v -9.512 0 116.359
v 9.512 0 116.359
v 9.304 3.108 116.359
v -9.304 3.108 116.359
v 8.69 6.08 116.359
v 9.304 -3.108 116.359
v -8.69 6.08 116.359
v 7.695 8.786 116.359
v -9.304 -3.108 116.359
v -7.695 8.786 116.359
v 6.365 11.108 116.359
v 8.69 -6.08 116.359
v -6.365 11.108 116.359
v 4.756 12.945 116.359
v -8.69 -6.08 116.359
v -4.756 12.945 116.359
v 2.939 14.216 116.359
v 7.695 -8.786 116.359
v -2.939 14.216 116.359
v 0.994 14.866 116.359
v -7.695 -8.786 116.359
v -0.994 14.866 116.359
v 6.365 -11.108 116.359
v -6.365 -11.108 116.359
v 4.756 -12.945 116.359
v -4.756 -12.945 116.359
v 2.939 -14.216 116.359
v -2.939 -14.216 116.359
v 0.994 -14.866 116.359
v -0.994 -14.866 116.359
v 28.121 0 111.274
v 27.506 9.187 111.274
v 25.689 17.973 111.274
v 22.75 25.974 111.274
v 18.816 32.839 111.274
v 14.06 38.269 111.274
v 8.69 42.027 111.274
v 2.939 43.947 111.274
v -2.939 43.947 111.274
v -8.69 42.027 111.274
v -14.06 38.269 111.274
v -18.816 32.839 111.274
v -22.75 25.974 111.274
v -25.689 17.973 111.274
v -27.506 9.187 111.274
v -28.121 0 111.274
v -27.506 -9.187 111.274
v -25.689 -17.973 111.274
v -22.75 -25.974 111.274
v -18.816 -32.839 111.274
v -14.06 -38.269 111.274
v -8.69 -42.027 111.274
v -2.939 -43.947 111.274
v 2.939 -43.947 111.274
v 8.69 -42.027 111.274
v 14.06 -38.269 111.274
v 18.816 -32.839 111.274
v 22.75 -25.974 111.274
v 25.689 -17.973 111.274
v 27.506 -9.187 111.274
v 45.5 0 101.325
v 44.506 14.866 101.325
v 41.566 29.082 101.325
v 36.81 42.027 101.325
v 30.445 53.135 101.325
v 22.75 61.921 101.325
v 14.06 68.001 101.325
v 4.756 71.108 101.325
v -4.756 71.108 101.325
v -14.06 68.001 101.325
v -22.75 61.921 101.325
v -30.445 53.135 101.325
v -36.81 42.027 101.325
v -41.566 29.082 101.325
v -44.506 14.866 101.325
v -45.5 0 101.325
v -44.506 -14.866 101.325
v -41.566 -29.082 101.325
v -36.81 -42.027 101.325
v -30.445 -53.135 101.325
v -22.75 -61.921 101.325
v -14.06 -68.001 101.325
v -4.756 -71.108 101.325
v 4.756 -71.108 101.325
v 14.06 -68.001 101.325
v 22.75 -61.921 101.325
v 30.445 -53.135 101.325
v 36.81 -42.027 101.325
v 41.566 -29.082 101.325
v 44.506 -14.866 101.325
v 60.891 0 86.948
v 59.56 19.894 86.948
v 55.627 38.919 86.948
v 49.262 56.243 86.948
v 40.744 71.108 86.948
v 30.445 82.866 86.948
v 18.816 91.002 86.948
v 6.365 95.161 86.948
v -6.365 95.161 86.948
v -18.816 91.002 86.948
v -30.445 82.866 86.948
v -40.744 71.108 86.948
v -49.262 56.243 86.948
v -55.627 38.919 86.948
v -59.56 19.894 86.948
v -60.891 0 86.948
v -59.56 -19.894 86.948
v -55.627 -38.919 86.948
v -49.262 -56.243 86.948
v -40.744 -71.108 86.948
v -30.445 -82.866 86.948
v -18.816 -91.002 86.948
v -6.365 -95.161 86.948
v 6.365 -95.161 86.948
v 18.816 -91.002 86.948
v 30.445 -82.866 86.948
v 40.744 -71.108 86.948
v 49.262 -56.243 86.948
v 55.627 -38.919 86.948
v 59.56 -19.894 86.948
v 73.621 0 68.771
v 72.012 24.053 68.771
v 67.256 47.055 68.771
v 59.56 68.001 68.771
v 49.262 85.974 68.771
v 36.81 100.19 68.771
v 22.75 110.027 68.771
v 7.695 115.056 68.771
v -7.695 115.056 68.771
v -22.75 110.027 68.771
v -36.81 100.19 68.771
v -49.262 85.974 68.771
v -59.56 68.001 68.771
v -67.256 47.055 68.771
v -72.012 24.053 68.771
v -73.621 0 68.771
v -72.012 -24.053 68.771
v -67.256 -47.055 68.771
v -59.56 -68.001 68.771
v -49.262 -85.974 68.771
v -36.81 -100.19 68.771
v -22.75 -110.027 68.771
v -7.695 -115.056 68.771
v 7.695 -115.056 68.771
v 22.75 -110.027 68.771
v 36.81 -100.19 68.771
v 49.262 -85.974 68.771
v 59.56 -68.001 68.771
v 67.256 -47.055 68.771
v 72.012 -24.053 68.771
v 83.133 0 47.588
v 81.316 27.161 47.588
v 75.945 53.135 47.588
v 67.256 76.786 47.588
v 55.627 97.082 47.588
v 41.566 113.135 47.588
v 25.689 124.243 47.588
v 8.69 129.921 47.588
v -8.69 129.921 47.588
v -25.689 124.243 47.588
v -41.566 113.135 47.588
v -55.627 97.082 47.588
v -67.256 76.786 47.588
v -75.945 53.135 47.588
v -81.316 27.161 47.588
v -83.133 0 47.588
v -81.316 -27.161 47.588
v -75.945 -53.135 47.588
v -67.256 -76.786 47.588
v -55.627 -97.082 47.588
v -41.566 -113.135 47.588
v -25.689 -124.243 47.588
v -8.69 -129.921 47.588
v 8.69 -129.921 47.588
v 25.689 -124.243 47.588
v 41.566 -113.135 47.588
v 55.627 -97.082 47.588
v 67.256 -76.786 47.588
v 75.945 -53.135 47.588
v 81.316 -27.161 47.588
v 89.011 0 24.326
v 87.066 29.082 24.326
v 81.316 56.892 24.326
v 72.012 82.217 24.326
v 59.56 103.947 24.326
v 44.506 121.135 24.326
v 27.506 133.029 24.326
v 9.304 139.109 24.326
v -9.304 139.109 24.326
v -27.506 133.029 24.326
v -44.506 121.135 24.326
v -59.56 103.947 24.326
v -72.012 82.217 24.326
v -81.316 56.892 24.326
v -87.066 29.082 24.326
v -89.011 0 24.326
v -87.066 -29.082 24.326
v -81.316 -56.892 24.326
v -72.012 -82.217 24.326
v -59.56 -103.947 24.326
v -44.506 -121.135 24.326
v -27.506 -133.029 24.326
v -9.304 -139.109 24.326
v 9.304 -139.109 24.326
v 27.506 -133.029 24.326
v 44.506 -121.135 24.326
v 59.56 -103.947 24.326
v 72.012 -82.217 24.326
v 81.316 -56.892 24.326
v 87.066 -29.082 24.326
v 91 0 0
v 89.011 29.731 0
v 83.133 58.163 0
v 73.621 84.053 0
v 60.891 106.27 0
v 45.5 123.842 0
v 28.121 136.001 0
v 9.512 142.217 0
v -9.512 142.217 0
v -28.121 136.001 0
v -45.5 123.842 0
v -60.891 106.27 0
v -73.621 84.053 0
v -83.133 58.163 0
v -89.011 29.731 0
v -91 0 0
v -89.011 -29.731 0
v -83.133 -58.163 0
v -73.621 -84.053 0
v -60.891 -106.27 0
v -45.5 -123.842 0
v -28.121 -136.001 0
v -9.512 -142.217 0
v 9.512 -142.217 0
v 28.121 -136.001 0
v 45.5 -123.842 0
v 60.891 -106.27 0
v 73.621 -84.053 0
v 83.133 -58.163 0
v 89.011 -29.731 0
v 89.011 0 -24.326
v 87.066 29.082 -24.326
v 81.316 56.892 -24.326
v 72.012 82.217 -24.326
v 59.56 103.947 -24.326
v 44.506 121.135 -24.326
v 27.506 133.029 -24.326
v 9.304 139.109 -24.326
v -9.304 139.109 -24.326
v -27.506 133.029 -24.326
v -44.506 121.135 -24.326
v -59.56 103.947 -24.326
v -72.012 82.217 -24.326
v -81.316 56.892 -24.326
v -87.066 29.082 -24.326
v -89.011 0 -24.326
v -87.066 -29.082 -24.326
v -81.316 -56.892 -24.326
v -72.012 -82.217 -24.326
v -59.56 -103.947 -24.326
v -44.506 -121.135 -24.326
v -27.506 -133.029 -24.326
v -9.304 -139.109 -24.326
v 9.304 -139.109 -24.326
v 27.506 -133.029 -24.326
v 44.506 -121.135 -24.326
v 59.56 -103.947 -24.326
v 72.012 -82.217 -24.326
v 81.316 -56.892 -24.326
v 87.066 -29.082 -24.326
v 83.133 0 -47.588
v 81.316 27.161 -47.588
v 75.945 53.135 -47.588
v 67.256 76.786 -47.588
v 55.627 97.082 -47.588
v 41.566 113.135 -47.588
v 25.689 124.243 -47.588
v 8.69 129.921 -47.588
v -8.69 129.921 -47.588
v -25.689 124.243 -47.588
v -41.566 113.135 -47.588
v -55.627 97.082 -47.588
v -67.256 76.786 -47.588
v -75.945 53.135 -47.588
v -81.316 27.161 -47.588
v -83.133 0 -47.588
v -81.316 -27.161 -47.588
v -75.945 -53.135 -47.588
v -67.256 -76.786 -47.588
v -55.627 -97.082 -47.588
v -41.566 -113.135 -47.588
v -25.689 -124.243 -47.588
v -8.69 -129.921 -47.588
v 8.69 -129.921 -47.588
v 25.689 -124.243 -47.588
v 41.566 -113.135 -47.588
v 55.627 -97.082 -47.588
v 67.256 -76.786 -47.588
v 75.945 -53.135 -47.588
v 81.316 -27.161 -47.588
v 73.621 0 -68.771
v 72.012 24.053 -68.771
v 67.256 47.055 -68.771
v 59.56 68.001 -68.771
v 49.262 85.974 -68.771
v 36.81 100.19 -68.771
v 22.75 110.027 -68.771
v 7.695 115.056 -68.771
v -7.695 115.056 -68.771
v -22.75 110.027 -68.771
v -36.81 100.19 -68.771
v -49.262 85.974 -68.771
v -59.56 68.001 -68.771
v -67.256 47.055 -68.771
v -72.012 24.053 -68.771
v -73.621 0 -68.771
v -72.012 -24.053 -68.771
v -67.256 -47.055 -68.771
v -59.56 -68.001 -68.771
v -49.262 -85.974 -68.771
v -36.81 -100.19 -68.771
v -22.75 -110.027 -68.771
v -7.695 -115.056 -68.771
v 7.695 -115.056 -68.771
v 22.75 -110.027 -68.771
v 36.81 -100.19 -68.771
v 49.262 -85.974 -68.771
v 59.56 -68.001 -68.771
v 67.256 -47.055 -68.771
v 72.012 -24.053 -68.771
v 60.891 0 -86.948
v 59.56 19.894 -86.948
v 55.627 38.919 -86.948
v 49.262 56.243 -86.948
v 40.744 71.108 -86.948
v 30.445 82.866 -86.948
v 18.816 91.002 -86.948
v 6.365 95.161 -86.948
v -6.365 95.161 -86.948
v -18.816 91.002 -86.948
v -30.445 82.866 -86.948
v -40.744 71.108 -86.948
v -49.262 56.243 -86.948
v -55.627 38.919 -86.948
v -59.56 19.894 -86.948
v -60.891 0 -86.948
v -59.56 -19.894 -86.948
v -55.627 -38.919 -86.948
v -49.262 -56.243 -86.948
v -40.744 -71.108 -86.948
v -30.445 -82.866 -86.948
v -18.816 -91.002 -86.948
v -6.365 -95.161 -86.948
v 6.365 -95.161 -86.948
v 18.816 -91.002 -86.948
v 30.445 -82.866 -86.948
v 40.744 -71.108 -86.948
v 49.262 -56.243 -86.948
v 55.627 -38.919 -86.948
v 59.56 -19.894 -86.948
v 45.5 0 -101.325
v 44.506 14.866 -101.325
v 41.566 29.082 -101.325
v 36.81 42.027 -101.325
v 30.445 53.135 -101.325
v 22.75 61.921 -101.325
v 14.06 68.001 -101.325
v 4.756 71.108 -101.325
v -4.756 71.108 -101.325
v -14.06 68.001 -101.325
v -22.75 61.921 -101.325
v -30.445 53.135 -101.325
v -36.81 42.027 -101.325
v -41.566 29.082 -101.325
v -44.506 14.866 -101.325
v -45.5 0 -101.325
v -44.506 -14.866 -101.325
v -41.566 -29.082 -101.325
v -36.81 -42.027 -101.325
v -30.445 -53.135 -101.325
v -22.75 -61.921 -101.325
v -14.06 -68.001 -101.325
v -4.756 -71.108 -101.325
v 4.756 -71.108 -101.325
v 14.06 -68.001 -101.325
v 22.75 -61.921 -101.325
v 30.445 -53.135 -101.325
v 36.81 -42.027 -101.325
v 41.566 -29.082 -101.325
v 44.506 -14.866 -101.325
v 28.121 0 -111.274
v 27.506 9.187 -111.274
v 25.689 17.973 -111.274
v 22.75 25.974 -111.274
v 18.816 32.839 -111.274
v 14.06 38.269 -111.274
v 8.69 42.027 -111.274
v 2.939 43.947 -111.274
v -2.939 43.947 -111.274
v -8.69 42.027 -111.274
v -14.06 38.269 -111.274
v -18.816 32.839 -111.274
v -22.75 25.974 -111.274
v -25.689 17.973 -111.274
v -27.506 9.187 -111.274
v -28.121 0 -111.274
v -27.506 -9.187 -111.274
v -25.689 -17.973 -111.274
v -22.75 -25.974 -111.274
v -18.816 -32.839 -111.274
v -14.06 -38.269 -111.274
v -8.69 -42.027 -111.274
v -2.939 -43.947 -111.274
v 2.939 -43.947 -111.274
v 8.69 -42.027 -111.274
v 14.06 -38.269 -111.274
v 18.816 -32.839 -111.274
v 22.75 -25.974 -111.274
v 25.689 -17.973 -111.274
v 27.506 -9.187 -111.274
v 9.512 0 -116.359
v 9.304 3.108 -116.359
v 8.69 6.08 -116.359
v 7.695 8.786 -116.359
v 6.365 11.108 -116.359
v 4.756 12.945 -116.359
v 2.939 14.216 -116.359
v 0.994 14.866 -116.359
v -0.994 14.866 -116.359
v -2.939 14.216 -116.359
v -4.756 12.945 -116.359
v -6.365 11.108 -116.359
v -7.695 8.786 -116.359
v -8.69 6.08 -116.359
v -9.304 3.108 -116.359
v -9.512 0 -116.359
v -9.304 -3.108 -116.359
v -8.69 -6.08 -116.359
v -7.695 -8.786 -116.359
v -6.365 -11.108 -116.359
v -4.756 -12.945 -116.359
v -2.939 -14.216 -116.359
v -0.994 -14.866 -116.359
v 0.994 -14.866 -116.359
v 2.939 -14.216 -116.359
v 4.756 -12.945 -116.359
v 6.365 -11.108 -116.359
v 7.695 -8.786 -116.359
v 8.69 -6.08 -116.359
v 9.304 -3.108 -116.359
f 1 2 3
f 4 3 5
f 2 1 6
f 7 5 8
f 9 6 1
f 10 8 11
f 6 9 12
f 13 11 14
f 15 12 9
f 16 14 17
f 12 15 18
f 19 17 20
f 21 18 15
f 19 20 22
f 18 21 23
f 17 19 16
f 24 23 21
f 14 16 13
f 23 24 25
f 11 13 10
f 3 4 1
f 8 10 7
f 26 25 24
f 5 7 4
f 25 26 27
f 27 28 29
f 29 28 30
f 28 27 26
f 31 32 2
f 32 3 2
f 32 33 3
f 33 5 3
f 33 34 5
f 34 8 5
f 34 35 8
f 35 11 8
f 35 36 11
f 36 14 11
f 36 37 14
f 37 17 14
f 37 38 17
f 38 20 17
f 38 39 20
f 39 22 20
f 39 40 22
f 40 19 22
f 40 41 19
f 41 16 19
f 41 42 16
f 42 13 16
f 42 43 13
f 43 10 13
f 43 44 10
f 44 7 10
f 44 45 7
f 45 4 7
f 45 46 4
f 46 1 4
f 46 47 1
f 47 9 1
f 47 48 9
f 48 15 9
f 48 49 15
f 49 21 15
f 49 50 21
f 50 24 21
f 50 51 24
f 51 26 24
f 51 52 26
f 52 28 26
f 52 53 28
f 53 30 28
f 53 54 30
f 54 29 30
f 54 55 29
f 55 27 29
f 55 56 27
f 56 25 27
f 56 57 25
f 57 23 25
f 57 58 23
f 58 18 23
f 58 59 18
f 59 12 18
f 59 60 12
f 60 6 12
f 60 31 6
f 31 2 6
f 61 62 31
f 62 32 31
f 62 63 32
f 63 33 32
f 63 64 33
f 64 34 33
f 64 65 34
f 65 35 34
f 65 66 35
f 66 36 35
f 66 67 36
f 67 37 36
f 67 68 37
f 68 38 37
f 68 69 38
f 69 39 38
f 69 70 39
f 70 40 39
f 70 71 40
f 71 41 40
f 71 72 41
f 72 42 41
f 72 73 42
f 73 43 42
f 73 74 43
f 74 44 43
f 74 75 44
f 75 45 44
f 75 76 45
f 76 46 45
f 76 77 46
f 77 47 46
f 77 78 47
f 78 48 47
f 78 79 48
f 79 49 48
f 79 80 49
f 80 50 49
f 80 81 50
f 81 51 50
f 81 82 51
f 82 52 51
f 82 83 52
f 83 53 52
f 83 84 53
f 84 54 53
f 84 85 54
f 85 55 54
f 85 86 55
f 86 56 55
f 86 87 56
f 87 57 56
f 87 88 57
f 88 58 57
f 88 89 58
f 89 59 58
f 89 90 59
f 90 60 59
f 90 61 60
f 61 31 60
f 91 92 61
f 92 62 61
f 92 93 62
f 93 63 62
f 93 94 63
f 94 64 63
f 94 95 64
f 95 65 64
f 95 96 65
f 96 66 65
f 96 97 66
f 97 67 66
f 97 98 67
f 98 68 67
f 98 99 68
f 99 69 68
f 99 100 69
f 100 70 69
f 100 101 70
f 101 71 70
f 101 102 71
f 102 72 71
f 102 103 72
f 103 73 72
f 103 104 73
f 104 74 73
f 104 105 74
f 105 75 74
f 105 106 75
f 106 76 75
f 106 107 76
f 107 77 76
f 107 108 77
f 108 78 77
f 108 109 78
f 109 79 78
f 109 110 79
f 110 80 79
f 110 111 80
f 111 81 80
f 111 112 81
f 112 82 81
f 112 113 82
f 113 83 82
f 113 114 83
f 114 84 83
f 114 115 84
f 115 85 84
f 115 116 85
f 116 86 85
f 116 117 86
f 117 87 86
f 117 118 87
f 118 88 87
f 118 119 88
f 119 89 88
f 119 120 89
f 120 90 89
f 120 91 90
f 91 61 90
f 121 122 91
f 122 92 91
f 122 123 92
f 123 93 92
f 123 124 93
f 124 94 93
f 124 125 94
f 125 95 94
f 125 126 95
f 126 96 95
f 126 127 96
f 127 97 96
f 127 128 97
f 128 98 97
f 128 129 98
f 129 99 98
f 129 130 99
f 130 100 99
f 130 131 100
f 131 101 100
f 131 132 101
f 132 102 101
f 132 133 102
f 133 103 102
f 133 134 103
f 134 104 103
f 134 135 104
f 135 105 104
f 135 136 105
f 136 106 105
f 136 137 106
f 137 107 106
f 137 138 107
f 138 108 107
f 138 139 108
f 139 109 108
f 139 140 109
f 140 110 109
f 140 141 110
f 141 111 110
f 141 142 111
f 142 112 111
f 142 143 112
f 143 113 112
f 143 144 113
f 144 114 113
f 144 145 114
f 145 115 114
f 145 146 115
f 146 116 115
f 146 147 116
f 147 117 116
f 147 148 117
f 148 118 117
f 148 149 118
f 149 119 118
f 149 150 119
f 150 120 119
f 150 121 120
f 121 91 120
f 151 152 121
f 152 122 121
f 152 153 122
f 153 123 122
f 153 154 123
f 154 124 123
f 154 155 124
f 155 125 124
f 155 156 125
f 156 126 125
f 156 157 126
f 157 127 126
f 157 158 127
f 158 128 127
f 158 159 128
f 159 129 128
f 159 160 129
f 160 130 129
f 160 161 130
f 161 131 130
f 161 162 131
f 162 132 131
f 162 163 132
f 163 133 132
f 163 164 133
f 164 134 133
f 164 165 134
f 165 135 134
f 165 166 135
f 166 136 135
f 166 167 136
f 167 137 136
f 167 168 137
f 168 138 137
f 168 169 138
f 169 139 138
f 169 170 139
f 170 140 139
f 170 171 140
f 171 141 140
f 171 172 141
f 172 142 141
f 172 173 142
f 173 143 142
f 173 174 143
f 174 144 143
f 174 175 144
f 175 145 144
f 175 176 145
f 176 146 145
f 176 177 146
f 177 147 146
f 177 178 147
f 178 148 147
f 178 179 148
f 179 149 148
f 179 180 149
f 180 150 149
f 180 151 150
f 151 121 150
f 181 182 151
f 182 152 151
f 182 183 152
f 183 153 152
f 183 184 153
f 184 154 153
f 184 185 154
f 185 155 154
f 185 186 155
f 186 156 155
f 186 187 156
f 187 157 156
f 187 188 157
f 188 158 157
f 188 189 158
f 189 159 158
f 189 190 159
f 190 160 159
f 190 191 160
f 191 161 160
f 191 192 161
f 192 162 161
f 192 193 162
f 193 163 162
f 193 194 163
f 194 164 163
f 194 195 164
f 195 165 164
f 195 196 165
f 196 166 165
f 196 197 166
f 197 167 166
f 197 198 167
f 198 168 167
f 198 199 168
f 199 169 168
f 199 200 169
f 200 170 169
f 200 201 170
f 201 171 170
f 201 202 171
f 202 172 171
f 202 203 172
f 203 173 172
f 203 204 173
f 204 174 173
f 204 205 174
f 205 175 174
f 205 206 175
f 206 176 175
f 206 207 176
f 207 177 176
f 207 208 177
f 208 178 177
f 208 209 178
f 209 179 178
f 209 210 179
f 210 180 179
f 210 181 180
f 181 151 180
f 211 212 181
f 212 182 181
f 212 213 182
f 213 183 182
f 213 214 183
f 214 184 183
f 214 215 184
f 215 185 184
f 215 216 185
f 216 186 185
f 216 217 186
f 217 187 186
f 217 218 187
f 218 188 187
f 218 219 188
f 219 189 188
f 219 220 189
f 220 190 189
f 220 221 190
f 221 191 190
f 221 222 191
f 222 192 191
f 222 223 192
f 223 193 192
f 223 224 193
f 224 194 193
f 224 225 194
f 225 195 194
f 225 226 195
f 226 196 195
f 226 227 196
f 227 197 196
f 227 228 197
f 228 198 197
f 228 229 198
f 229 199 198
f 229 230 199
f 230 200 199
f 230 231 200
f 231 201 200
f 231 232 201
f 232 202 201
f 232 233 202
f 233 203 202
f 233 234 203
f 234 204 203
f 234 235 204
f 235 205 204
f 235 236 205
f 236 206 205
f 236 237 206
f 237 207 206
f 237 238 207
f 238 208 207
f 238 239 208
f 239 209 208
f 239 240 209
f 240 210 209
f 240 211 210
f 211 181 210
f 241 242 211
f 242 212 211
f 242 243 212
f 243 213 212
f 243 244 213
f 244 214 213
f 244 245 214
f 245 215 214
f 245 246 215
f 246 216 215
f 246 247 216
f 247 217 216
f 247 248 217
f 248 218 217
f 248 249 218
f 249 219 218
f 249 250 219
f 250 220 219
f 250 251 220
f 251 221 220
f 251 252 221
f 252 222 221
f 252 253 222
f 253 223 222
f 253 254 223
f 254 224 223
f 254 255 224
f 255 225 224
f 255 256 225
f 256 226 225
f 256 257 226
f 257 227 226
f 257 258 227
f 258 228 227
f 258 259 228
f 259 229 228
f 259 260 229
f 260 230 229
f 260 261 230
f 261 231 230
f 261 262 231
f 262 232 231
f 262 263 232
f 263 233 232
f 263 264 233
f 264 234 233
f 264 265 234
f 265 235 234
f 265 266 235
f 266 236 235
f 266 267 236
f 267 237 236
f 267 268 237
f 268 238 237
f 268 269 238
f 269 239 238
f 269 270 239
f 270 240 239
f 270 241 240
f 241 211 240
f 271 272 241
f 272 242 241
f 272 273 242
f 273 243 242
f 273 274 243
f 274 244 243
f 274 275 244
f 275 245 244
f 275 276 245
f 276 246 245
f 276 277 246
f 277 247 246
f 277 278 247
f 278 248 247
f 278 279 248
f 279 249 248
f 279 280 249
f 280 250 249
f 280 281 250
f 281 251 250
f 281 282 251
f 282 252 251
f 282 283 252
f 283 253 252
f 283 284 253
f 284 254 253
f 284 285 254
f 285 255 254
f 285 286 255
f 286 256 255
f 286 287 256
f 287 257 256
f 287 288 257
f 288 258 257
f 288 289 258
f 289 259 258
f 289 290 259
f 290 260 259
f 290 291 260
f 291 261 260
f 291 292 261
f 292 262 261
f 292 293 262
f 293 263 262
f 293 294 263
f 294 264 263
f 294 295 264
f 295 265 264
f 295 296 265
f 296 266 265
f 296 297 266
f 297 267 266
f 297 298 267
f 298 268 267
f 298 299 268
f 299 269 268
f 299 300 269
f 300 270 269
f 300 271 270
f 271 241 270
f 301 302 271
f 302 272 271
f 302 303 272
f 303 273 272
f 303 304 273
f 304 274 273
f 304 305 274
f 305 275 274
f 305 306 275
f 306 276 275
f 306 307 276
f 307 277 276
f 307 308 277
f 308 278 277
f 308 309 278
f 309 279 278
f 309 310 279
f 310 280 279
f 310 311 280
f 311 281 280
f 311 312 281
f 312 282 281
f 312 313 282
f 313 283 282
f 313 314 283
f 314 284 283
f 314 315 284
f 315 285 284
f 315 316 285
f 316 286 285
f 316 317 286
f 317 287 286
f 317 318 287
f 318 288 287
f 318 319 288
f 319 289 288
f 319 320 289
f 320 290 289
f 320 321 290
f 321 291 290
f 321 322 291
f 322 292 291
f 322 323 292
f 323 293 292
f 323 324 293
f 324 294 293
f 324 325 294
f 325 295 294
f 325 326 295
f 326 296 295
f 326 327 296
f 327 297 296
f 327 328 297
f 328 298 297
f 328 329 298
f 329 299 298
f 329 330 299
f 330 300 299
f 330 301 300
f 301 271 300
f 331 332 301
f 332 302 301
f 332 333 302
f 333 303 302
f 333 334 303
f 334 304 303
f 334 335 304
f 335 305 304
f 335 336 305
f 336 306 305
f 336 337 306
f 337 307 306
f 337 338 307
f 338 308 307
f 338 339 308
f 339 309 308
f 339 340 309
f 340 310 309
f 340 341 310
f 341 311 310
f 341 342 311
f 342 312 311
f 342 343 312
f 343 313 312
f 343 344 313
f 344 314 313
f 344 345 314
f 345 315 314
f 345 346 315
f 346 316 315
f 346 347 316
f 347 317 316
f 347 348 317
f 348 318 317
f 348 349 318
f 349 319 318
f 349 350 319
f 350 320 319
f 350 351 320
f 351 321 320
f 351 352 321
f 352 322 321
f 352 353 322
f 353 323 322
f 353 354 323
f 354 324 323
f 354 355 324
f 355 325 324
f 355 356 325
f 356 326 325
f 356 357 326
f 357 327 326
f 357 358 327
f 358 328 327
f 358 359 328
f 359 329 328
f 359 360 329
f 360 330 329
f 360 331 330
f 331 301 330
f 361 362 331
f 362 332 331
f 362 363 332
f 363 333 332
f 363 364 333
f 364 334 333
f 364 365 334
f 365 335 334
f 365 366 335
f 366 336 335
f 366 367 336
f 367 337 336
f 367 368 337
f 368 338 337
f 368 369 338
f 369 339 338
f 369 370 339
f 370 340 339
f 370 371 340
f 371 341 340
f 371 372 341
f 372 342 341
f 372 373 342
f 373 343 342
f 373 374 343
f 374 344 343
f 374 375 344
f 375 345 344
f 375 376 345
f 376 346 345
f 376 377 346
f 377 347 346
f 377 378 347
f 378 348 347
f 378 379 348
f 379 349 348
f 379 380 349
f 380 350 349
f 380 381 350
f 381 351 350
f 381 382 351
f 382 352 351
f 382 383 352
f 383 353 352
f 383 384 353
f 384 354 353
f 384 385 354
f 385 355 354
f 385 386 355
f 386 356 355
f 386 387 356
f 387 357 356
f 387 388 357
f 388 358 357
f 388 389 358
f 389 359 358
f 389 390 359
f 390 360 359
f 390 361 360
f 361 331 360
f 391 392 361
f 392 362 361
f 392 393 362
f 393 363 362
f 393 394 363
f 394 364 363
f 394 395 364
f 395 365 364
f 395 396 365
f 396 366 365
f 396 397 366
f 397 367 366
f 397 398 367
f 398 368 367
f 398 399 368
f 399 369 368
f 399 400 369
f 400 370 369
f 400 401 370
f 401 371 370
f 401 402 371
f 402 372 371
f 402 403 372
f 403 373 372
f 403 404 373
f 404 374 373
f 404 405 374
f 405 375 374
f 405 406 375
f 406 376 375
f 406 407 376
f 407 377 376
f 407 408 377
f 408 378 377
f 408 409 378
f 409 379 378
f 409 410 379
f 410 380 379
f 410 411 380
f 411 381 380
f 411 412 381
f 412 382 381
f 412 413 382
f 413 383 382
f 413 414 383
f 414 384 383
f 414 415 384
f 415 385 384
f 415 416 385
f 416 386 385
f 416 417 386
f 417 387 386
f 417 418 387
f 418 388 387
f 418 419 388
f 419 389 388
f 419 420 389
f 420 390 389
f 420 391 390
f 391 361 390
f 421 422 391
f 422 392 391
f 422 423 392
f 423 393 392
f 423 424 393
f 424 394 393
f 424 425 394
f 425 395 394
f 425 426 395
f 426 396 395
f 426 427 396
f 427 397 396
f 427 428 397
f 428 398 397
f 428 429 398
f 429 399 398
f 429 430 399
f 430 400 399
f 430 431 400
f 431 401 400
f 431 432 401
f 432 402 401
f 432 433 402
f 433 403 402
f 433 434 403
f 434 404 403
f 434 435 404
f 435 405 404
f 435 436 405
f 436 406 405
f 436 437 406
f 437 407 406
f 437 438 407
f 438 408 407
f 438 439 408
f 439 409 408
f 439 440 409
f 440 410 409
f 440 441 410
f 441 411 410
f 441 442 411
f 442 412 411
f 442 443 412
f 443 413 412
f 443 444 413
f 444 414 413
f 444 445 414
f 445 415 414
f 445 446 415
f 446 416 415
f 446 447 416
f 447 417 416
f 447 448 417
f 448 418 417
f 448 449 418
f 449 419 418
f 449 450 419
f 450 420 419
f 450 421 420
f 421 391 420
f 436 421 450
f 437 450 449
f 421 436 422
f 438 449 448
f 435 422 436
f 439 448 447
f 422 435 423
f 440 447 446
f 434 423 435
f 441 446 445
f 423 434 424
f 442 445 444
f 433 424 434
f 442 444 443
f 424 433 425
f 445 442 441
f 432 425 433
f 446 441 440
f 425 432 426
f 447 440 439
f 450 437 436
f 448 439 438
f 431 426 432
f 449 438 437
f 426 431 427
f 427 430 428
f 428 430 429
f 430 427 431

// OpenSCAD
// Generated by SolidPython 1.0.1 on 2020-07-29 00:46:47


scale(v = [7, 11, 9]) {
	sphere(r = 13);
}
/***********************************************
*********      SolidPython code:      **********
************************************************
 
# import packages: SolidPython
from solid import *
from solid.utils import *
from itertools import chain, combinations, permutations


class Resize:

    def __init__(self, scad_file):
        self.scad_file = scad_file
        #self.scad_file = import_scad(scad_file)
        # cone/cylinder param:
        self.r1 = 0
        self.r2 = 0
        self.h = 0
        # rectangular prism param:
        self.w = 0
        self.l = 0
        # ellipse param:
        self.r = 0

    # import OpenScad code (file name corresponds to shape)


    # classify shape + parameters
    def assign(self, param1, param2, param3):
        if self.scad_file == 'cone.scad':
            self.r1 = param1
            self.r2 = param2
            self.h = param3
        elif self.scad_file == 'cylinder.scad':
            self.r1 = param1
            self.r2 = param2
            self.h = param3
        elif self.scad_file == 'rectangularPrism.scad':
            self.h = param1
            self.l = param2
            self.w = param3
        else:
            self.r = param1
            self.h = param2

    # resize parameters
    def iterate(self):
        x = range(3, 20, 2)
        i = 1
        if self.scad_file == 'cone.scad':
            tempList = list(permutations(x, 2))
            for temp in tempList:
                param1 = temp[0]
                param2 = temp[1]
                filepath = 'produced_scad_files/' + 'cone' + str(param1) + '_' + str(param2) + '_' + '.scad'
                scad_render_to_file(cylinder(h=param1, r1=param2, r2=0), filepath)

        elif self.scad_file == 'cylinder.scad':
            tempList = list(permutations(x, 3))
            for temp in tempList:
                param1 = temp[0]
                param2 = temp[1]
                filepath = 'produced_scad_files/' + 'cylinder' + str(param1) + '_' + str(param2) + '_' + '.scad'
                scad_render_to_file(cylinder(h=param1, r1=param2, r2=param2), filepath)

        elif self.scad_file == 'rectangularPrism.scad':
            tempList = list(permutations(x, 3))
            for temp in tempList:
                param1 = temp[0]
                param2 = temp[1]
                param3 = temp[2]
                filepath = 'produced_scad_files/' + 'rectangularPrism' + str(param1) + '_' + str(param2) + '_' + str(
                    param3) + '.scad'
                scad_render_to_file(cube(size=(param1, param2, param3)), filepath)

        elif self.scad_file == 'ellipse.scad':
            tempList = list(permutations(x, 4))
            for temp in tempList:
                param1 = temp[0]
                param2 = temp[1]
                param3 = temp[2]
                param4 = temp[3]
                filepath = 'produced_scad_files/' + 'ellipse' + str(param1) + '_' + str(param2) + '_' + str(param3) + '_' + str(param4) + '.scad'
                scad_render_to_file(scale([param1, param2, param3])(sphere(r=param4)), filepath)

    def render_to_scadfile(self):
        scad_render_to_file(scad, 'example.scad') 
 
************************************************/
